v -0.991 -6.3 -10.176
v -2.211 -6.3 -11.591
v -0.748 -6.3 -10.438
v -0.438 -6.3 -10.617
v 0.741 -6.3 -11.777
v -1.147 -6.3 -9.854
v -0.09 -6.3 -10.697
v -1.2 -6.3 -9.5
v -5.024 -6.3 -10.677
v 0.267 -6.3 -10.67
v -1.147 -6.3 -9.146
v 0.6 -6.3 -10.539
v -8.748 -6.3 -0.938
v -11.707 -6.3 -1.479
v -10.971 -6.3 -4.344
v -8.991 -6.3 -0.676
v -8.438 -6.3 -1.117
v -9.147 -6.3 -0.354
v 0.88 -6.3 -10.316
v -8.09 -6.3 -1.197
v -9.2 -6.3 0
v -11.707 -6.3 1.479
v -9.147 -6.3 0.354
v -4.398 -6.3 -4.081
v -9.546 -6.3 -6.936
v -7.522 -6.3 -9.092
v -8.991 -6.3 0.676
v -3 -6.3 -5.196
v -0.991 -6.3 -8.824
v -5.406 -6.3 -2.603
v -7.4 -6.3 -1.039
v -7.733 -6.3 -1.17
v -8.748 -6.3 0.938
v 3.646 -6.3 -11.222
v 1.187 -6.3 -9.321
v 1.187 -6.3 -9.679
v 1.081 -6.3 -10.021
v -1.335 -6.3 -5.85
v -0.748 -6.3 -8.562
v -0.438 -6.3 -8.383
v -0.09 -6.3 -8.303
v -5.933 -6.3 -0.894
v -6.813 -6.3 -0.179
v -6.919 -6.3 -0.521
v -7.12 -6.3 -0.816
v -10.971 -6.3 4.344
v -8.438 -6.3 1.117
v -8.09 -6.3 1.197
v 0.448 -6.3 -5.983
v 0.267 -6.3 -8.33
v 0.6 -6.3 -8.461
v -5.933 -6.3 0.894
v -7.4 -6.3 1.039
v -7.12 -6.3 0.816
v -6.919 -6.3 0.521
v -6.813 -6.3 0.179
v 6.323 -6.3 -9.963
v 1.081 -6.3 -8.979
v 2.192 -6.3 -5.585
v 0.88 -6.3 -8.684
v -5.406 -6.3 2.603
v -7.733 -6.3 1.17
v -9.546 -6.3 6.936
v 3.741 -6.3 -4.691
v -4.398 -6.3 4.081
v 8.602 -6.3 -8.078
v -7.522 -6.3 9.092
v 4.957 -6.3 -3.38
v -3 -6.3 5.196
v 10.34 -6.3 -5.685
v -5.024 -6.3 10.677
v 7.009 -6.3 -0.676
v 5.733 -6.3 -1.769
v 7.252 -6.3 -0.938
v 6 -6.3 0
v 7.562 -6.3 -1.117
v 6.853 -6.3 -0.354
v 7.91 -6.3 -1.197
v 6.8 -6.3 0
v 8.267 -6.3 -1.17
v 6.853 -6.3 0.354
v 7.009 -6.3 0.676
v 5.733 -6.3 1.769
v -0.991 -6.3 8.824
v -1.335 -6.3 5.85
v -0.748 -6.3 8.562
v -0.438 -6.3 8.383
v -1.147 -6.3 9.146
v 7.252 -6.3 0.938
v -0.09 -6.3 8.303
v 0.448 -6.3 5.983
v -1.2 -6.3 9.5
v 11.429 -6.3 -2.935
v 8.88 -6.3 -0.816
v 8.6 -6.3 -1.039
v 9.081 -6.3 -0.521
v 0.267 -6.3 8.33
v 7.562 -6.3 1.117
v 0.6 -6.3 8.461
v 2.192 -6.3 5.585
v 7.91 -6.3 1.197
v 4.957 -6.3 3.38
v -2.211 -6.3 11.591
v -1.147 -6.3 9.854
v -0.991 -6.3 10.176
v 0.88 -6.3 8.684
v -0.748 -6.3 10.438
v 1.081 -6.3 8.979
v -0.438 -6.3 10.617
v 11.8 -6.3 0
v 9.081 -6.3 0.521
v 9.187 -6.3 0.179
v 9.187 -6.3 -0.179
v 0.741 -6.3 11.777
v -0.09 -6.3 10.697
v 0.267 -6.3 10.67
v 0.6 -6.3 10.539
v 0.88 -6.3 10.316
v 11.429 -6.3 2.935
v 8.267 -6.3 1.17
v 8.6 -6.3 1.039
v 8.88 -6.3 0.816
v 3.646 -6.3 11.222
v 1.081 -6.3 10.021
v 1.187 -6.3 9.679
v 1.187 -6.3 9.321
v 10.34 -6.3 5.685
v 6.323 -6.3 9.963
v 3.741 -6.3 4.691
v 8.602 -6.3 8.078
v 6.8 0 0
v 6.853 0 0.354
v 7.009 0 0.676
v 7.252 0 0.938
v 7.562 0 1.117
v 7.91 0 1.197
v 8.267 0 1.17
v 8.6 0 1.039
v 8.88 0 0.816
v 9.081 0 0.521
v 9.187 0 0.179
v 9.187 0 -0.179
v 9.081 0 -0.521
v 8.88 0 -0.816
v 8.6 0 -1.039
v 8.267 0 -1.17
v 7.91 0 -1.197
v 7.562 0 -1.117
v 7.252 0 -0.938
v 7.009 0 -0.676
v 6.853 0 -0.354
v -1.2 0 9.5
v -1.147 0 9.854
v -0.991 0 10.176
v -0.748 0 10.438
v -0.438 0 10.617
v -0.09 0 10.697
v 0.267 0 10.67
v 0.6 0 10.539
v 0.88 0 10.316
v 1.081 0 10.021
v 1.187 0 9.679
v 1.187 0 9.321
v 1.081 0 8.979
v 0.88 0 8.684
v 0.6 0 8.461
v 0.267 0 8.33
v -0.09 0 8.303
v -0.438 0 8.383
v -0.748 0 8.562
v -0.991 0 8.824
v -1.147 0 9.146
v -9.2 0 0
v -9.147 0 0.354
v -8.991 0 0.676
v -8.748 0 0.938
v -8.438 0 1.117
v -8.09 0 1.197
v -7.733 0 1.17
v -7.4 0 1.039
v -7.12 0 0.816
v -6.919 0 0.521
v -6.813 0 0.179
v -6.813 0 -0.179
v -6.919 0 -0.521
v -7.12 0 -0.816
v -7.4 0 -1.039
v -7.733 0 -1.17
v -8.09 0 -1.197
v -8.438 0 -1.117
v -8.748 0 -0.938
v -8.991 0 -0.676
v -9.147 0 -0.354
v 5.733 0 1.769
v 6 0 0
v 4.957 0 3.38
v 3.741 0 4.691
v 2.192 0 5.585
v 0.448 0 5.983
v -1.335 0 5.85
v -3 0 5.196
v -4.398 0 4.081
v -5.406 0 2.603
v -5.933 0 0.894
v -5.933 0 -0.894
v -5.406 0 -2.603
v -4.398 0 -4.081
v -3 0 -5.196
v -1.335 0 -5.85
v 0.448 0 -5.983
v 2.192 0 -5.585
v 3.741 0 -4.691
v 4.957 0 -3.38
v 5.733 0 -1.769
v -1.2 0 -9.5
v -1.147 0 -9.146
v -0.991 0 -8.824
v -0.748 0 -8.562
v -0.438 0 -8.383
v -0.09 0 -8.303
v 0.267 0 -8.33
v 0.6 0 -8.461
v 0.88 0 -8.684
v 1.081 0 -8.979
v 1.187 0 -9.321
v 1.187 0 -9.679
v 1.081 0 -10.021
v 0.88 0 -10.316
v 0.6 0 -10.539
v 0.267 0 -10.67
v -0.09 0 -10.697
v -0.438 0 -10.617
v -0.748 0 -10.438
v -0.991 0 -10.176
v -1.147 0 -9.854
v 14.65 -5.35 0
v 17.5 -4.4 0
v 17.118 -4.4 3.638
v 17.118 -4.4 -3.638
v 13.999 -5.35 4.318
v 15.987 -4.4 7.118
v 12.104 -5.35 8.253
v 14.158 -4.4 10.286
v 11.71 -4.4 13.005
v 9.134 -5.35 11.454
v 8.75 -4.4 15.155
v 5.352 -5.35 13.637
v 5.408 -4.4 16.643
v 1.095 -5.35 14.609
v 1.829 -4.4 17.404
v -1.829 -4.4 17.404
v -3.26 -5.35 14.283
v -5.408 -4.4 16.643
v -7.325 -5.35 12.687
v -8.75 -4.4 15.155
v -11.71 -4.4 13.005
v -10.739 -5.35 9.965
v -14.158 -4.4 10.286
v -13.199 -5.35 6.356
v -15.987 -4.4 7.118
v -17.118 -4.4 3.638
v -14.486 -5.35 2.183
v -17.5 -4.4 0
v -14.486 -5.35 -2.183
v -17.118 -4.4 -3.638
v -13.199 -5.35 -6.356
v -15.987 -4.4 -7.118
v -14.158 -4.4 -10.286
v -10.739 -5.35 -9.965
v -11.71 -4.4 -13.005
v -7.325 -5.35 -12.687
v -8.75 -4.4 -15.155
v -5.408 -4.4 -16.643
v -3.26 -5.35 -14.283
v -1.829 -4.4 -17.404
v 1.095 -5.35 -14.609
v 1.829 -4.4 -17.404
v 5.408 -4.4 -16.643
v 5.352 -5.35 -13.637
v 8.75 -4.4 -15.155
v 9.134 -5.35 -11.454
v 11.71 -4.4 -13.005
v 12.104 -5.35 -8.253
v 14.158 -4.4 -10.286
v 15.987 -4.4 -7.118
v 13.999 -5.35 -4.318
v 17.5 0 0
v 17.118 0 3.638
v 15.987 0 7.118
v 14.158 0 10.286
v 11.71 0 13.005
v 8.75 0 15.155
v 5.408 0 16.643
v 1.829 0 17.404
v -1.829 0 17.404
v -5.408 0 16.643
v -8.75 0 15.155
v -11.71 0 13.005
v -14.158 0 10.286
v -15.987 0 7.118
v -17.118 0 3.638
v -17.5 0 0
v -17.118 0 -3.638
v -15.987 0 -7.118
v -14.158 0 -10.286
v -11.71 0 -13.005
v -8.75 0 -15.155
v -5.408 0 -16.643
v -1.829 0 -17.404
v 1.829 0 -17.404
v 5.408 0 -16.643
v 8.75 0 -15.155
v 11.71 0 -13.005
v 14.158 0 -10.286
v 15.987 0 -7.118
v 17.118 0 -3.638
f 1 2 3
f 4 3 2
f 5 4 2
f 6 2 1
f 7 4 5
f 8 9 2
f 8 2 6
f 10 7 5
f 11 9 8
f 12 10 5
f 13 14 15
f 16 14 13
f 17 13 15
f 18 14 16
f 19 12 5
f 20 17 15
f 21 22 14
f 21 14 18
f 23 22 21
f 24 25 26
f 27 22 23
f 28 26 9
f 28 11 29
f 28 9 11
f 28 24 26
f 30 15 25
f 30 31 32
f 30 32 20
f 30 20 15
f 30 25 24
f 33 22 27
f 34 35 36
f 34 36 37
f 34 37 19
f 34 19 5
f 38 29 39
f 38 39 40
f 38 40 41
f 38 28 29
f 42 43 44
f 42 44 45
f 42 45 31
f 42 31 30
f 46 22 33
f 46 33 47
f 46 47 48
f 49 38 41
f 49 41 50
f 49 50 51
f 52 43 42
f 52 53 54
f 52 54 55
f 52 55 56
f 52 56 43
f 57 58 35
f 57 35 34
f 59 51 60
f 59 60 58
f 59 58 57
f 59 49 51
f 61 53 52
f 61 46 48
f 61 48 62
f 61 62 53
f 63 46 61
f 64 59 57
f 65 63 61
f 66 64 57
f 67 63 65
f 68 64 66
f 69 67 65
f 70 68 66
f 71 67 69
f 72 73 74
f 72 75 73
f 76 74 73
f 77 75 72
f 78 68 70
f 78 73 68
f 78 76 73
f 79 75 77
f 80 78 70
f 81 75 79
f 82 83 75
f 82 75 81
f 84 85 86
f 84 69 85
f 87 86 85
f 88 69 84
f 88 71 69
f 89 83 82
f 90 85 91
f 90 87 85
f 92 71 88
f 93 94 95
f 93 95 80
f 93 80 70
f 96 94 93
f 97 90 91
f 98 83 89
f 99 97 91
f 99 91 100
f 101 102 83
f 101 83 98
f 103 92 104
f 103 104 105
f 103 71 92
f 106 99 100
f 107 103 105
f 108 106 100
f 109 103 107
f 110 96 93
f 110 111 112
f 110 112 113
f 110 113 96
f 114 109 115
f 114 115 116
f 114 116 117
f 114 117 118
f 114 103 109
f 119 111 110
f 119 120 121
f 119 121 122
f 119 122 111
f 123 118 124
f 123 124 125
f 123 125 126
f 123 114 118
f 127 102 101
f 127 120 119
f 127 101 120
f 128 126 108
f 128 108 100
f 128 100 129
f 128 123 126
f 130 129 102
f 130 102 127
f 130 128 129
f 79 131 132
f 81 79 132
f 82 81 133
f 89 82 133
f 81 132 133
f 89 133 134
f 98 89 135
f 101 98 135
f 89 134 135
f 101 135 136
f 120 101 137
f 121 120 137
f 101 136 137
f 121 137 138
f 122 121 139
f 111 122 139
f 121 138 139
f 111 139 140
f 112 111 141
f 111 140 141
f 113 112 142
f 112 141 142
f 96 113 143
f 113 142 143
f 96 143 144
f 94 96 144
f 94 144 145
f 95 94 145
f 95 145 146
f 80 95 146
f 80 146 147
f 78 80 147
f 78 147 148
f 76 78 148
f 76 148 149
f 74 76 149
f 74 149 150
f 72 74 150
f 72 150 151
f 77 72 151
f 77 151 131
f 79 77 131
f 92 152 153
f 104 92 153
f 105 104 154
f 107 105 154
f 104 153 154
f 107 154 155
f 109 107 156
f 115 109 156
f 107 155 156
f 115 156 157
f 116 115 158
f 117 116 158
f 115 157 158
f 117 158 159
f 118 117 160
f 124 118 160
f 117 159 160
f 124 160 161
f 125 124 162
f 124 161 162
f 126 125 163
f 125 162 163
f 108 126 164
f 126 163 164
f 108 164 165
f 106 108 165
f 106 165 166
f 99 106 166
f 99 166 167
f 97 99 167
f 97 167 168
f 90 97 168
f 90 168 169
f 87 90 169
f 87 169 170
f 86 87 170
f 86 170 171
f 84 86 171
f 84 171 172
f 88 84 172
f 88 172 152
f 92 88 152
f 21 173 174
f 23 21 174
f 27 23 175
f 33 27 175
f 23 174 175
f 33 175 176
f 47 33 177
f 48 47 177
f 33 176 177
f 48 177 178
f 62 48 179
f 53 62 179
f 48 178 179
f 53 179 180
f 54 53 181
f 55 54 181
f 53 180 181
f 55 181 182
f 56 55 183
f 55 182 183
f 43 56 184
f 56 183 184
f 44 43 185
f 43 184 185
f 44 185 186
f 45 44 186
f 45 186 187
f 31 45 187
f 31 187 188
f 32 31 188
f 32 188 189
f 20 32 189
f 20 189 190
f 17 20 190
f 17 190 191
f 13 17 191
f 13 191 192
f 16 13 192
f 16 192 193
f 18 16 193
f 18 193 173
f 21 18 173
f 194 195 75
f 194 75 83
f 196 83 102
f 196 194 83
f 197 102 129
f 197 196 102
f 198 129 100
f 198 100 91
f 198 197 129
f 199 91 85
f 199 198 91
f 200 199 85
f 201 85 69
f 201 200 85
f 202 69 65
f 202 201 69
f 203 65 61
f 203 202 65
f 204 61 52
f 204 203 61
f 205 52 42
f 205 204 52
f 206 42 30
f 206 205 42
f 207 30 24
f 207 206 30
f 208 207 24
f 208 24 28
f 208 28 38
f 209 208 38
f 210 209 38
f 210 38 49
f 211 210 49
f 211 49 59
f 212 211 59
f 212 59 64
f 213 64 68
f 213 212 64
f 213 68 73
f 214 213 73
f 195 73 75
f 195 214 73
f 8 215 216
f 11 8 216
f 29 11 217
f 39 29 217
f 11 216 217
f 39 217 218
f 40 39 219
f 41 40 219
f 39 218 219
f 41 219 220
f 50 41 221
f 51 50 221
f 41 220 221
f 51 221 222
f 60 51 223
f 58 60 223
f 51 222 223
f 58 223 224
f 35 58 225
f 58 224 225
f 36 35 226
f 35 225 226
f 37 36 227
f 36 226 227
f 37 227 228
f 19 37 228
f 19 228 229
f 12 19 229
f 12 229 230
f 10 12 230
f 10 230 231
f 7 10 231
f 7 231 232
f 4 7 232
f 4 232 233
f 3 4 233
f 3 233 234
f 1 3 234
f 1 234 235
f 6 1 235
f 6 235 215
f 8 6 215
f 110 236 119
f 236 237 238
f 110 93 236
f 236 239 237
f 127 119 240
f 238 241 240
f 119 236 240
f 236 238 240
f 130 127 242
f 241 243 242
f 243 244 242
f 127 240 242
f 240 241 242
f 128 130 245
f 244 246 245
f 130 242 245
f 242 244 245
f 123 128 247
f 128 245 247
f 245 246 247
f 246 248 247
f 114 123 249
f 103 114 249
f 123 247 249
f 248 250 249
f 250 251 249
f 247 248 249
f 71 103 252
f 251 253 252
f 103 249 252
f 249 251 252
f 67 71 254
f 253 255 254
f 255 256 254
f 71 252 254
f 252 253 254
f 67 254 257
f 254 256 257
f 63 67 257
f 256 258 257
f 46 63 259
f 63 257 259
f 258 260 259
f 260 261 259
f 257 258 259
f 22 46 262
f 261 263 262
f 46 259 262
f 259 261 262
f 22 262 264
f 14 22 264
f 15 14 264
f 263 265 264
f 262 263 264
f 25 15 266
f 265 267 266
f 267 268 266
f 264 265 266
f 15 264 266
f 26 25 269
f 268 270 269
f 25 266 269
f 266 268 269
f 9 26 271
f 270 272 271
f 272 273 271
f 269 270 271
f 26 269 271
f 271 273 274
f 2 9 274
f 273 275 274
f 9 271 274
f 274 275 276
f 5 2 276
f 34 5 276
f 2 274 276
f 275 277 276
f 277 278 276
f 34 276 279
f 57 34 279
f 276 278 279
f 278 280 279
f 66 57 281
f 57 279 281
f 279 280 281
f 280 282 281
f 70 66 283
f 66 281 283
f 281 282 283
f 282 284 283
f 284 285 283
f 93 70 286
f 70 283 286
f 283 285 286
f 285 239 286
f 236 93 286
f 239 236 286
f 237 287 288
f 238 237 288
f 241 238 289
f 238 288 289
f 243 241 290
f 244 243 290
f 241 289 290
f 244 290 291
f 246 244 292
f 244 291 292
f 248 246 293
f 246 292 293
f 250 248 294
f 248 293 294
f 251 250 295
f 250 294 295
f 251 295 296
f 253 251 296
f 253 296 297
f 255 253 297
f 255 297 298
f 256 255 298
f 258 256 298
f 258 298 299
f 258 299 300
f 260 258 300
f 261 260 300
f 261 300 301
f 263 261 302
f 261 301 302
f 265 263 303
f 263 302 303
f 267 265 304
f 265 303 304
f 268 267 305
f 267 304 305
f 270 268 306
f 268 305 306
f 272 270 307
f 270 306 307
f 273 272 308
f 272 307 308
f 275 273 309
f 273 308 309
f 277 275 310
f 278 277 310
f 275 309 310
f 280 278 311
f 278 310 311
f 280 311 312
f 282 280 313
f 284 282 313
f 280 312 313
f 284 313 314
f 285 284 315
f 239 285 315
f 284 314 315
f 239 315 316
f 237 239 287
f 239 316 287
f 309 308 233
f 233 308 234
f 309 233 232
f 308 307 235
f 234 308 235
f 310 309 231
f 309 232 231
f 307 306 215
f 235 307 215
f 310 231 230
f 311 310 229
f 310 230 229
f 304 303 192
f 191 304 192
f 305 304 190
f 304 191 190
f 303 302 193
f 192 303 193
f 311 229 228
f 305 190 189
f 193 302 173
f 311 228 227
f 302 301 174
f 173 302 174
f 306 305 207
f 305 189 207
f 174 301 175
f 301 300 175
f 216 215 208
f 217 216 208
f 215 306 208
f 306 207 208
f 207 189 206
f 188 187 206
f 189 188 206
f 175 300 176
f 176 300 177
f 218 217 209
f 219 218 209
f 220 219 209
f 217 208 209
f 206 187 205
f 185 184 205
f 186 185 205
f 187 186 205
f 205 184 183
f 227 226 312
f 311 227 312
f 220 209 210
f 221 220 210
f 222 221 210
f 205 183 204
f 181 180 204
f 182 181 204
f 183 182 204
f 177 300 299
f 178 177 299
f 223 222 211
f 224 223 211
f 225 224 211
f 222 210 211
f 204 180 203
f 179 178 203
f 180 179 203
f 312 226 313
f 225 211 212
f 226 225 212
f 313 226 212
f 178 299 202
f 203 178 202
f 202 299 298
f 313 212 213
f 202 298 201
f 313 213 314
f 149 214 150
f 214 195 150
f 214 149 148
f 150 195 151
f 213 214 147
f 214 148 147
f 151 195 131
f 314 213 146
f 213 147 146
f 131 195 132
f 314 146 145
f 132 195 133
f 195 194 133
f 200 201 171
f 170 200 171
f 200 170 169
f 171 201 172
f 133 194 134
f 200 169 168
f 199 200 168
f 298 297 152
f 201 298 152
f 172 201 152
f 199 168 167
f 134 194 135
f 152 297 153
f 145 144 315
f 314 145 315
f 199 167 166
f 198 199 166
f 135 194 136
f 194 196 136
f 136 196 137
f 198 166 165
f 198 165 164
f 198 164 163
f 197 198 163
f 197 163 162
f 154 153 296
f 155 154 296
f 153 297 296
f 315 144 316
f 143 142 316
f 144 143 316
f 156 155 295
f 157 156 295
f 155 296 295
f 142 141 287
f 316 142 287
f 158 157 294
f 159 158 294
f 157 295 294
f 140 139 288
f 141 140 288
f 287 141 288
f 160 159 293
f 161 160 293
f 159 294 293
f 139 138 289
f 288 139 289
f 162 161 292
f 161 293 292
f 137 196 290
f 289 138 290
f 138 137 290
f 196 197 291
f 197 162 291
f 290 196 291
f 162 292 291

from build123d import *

# Parameters (mm, degrees)
F0_R     = 17.5
F0_R_2   = 6
F1_DEPTH = 6.3
F2_SIZE2 = 1.9
F2_SIZE  = 5.7
F4_D     = 2.4


with BuildPart() as f1:
    # F0 (on Front) → F1 (new body)
    with BuildSketch(Plane.XZ):
        Circle(F0_R)
        Circle(F0_R_2, mode=Mode.SUBTRACT)
    extrude(amount=F1_DEPTH)

    # F2
    f2_edges = [f1.edges().sort_by_distance(p)[0] for p in [
        (-17.5, -6.3, 0),
    ]]
    f2_side = f1.faces().sort_by_distance((-17.005025, -6.3, 0))[0]
    chamfer(f2_edges, length=F2_SIZE, length2=F2_SIZE2, reference=f2_side)

    # F4 (through all)
    with Locations(Plane.XZ.offset(6.3)):
        with Locations((0, 9.5), (-8, 0), (0, -9.5), (8, 0)):
            Hole(F4_D / 2)


solid = f1.part
